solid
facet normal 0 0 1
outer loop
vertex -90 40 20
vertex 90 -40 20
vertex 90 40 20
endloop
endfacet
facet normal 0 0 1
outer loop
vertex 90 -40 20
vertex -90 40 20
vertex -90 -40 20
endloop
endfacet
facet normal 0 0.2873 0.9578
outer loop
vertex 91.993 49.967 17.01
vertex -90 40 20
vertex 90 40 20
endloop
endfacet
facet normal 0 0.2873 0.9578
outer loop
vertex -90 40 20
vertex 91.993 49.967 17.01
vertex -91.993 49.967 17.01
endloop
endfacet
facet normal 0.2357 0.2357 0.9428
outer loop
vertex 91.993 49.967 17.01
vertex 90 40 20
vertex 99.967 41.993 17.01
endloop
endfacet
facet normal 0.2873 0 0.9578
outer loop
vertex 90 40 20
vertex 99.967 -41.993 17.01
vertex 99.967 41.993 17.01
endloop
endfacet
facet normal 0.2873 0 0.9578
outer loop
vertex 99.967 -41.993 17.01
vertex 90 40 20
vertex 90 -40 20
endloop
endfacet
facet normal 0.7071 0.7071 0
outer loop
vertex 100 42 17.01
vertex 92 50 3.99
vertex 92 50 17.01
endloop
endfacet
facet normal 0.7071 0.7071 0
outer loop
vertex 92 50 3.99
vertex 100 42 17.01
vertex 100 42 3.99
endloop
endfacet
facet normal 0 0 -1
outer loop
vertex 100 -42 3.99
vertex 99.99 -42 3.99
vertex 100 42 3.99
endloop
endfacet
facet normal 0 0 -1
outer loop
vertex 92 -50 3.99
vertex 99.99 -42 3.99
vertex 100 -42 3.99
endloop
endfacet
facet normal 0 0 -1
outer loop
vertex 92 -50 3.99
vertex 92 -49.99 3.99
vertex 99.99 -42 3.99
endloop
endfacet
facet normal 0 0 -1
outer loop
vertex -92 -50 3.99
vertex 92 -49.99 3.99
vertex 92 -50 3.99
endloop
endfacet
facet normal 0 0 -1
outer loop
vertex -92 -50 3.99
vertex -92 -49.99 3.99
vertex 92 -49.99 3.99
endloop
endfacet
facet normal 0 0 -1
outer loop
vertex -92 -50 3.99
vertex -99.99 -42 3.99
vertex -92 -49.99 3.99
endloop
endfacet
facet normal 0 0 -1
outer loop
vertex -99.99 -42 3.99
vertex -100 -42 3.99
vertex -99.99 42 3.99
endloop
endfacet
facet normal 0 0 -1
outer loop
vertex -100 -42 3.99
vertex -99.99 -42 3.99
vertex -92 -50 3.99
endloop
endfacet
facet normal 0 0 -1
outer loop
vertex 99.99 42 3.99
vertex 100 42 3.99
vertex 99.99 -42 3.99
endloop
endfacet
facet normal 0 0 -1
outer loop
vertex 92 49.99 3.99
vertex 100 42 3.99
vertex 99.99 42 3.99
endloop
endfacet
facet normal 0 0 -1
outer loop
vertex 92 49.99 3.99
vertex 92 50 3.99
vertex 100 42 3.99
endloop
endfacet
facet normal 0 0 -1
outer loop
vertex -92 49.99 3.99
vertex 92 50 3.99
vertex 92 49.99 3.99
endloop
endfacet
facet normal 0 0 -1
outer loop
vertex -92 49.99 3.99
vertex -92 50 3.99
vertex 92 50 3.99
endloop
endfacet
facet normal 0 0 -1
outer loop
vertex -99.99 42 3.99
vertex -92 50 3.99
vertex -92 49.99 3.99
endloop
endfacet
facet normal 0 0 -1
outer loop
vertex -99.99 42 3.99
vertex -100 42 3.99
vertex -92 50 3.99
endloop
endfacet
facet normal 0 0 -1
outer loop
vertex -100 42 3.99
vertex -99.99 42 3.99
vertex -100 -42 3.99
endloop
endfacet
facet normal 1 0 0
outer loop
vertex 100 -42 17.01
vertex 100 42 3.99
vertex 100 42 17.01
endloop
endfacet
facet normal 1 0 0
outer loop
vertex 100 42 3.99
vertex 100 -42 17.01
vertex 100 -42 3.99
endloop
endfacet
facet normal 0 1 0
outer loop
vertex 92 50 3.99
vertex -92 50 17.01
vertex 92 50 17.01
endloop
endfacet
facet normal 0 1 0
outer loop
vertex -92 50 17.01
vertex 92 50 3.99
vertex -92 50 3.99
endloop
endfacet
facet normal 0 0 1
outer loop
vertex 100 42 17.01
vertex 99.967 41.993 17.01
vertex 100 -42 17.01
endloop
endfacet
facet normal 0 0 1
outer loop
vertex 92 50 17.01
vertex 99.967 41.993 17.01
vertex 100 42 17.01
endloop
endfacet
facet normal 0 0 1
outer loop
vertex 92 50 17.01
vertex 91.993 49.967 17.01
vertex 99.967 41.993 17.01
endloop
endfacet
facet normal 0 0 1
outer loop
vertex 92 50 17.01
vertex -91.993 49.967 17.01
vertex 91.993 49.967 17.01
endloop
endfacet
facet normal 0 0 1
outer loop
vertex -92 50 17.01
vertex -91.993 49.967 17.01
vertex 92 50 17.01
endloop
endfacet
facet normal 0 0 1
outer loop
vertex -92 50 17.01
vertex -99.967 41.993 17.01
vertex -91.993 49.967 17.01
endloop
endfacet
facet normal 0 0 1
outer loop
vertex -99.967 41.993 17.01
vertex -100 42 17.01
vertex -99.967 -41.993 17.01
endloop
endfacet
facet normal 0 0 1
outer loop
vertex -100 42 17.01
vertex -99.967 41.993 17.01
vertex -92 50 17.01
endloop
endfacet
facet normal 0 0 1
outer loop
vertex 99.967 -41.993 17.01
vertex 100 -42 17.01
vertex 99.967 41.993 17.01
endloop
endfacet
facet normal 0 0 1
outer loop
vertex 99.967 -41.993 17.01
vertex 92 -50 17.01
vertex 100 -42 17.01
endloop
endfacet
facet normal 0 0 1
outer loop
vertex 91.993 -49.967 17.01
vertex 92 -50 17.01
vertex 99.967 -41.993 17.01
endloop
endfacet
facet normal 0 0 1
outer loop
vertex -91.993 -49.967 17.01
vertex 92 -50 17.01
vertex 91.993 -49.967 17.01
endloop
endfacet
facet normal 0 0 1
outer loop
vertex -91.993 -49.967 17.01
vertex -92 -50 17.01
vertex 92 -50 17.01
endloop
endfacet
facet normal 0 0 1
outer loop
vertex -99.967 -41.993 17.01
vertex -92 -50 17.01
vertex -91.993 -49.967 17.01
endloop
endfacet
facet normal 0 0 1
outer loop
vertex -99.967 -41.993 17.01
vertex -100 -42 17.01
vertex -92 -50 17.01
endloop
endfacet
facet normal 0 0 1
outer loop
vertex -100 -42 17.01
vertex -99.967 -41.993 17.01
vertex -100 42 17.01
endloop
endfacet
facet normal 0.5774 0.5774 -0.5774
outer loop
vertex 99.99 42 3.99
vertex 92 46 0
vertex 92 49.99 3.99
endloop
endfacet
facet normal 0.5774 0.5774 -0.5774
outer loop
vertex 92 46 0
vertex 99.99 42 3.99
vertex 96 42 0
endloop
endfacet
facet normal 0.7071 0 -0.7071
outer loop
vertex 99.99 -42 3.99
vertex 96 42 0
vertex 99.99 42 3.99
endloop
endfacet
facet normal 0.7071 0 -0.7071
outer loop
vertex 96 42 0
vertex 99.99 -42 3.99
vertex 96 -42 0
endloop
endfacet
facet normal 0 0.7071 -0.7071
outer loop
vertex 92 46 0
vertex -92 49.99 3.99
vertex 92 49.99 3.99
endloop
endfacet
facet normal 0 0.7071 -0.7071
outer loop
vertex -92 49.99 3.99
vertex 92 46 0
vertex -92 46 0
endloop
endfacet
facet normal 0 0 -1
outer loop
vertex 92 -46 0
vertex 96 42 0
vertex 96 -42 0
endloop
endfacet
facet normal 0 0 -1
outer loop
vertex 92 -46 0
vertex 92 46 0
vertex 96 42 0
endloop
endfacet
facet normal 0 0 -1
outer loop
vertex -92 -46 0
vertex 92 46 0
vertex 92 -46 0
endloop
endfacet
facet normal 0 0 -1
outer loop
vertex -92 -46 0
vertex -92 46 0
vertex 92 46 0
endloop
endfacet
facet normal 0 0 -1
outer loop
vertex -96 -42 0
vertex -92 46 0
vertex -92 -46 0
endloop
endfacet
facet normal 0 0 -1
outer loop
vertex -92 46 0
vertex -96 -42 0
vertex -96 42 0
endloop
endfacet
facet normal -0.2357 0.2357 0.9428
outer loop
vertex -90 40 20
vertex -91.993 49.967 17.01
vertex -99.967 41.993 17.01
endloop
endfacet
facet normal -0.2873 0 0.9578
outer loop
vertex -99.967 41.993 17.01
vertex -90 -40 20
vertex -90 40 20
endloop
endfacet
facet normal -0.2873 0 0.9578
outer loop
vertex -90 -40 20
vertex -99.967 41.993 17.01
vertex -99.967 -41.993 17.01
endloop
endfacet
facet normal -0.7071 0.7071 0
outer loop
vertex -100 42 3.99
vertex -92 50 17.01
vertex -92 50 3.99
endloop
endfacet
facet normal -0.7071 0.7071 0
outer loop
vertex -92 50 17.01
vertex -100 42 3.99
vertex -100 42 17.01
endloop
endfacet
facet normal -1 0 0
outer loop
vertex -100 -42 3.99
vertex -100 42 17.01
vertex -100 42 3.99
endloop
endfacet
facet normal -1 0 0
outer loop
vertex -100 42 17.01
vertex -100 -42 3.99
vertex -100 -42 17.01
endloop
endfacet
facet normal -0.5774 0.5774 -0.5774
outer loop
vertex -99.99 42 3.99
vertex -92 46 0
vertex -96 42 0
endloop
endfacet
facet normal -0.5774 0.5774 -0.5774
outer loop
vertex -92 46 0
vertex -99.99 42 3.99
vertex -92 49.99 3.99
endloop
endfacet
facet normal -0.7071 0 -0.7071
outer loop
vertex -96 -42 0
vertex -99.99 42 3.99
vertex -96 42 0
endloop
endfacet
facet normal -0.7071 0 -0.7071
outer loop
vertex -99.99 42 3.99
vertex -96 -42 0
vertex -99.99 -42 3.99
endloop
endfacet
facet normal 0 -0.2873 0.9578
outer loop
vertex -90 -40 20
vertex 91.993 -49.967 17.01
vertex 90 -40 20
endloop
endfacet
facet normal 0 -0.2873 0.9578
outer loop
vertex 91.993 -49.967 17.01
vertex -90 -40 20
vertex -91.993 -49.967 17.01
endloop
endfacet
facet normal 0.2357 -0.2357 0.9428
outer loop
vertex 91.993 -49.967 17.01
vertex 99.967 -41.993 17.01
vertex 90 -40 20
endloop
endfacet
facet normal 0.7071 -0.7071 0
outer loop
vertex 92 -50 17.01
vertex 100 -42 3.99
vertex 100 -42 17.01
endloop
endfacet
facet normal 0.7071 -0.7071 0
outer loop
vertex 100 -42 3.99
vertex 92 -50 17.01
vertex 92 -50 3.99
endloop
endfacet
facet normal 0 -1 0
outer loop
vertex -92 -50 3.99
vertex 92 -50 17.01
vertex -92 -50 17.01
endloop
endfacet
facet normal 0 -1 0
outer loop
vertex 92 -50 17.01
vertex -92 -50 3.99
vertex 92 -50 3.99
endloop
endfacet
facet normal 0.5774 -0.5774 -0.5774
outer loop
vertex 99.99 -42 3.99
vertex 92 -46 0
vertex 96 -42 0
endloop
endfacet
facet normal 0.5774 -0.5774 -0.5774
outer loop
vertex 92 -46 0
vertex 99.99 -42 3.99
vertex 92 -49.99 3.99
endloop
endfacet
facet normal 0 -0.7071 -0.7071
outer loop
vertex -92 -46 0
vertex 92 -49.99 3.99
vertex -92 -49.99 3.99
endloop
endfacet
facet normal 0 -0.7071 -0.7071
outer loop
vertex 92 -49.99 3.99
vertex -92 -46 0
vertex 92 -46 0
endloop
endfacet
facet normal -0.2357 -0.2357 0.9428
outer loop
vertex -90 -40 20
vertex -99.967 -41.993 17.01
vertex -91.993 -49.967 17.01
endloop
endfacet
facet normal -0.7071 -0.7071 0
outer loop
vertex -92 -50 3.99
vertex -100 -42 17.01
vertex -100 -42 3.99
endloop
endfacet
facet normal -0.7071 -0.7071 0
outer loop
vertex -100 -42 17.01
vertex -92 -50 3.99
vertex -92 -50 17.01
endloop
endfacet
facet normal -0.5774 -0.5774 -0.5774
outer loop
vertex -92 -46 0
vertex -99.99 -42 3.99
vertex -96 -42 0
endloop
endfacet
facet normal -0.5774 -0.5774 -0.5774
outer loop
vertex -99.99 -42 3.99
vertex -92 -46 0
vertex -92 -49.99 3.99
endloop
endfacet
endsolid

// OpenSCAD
// Beveled cube
//
// dim: dimensions of the cube
// bevel_top: 2d array width the dimensions of the bevel used
//   at the top of the cube. The first element specifies the 
//   amount the bevel goed towards the z-axis. The second
//   element the height of the bevel.
// bevel_size: single value with the dimension of the side 
//   bevel
// bevel_bottom: 2d array for the bottom bevel. See 
//   bevel_top. 
//
// The cube is centered at the origin for the x and y axis and 
// the bottom of the cube is positioned at z=0. 
// 
// Example:
 dim = [200, 100, 20];
 bevel_top  = [10, 3];
 bevel_side  = 8;
 bevel_bottom  = [4, 4];
 beveled_cube(dim, bevel_top, bevel_side, bevel_bottom);

module beveled_cube(dim, bevel_top, bevel_side, bevel_bottom) {
  mar = 0.01;
  d = [dim[0]*0.5+mar, dim[1]*0.5+mar, dim[2]];
  translate([-mar, -mar, 0])
    beveled_cube_q(d, bevel_top, bevel_side, bevel_bottom);
  mirror([1, 0, 0])
    translate([-mar, -mar, 0])
    beveled_cube_q(d, bevel_top, bevel_side, bevel_bottom);
  mirror([0, 1, 0])
    translate([-mar, -mar, 0])
    beveled_cube_q(d, bevel_top, bevel_side, bevel_bottom);
  mirror([1, 0, 0]) mirror([0, 1, 0])
    translate([-mar, -mar, 0])
    beveled_cube_q(d, bevel_top, bevel_side, bevel_bottom);
}

// Utility function for beveled_cube
module beveled_cube_q(dim, bt, bs, bb) {
  mar = 0.01;
  // top
  translate([0, 0, dim[2]-bt[1]])
    bevels([dim[0], dim[1], bt[1]], bt[0], bs);
  // middle
  translate([0, 0, bb[1]-mar])
    bevels([dim[0], dim[1], dim[2]-bt[1]-bb[1]+2*mar], 0, bs);
  //bottom
  translate([0, 0, bb[1]])
    mirror([0, 0, 1])
    bevels([dim[0], dim[1], bb[1]], bb[0], bs);
}

// Utility function for beveled_cube
module bevels(dim, bt, bs) {
  polyhedron(
    points = [
      [0, 0, 0], // 0
      [dim[0], 0, 0], // 1
      [dim[0]-bt, 0, dim[2]], // 2
      [0, 0, dim[2]],  // 3
      [dim[0], dim[1]-bs, 0], //4 
      [dim[0]-bt, min(dim[1]-bt, dim[1]-bs), dim[2]], //5
      [0, dim[1], 0],  // 6
      [dim[0]-bs, dim[1], 0], //7 
      [min(dim[0]-bt, dim[0]-bs), dim[1]-bt, dim[2]], //8
      [0, dim[1]-bt, dim[2]] //9
    ],
    faces = [
      [3, 9, 8, 5, 2], //top
      [0, 3, 2, 1], //front
      [0, 6, 9, 3], //left 
      [6, 7, 8, 9], // back
      [7, 4, 5, 8], // back-side-bevel
      [1, 2, 5, 4], // right side
      [0, 1, 4, 7, 6] // bottom
    ]
  );
}
